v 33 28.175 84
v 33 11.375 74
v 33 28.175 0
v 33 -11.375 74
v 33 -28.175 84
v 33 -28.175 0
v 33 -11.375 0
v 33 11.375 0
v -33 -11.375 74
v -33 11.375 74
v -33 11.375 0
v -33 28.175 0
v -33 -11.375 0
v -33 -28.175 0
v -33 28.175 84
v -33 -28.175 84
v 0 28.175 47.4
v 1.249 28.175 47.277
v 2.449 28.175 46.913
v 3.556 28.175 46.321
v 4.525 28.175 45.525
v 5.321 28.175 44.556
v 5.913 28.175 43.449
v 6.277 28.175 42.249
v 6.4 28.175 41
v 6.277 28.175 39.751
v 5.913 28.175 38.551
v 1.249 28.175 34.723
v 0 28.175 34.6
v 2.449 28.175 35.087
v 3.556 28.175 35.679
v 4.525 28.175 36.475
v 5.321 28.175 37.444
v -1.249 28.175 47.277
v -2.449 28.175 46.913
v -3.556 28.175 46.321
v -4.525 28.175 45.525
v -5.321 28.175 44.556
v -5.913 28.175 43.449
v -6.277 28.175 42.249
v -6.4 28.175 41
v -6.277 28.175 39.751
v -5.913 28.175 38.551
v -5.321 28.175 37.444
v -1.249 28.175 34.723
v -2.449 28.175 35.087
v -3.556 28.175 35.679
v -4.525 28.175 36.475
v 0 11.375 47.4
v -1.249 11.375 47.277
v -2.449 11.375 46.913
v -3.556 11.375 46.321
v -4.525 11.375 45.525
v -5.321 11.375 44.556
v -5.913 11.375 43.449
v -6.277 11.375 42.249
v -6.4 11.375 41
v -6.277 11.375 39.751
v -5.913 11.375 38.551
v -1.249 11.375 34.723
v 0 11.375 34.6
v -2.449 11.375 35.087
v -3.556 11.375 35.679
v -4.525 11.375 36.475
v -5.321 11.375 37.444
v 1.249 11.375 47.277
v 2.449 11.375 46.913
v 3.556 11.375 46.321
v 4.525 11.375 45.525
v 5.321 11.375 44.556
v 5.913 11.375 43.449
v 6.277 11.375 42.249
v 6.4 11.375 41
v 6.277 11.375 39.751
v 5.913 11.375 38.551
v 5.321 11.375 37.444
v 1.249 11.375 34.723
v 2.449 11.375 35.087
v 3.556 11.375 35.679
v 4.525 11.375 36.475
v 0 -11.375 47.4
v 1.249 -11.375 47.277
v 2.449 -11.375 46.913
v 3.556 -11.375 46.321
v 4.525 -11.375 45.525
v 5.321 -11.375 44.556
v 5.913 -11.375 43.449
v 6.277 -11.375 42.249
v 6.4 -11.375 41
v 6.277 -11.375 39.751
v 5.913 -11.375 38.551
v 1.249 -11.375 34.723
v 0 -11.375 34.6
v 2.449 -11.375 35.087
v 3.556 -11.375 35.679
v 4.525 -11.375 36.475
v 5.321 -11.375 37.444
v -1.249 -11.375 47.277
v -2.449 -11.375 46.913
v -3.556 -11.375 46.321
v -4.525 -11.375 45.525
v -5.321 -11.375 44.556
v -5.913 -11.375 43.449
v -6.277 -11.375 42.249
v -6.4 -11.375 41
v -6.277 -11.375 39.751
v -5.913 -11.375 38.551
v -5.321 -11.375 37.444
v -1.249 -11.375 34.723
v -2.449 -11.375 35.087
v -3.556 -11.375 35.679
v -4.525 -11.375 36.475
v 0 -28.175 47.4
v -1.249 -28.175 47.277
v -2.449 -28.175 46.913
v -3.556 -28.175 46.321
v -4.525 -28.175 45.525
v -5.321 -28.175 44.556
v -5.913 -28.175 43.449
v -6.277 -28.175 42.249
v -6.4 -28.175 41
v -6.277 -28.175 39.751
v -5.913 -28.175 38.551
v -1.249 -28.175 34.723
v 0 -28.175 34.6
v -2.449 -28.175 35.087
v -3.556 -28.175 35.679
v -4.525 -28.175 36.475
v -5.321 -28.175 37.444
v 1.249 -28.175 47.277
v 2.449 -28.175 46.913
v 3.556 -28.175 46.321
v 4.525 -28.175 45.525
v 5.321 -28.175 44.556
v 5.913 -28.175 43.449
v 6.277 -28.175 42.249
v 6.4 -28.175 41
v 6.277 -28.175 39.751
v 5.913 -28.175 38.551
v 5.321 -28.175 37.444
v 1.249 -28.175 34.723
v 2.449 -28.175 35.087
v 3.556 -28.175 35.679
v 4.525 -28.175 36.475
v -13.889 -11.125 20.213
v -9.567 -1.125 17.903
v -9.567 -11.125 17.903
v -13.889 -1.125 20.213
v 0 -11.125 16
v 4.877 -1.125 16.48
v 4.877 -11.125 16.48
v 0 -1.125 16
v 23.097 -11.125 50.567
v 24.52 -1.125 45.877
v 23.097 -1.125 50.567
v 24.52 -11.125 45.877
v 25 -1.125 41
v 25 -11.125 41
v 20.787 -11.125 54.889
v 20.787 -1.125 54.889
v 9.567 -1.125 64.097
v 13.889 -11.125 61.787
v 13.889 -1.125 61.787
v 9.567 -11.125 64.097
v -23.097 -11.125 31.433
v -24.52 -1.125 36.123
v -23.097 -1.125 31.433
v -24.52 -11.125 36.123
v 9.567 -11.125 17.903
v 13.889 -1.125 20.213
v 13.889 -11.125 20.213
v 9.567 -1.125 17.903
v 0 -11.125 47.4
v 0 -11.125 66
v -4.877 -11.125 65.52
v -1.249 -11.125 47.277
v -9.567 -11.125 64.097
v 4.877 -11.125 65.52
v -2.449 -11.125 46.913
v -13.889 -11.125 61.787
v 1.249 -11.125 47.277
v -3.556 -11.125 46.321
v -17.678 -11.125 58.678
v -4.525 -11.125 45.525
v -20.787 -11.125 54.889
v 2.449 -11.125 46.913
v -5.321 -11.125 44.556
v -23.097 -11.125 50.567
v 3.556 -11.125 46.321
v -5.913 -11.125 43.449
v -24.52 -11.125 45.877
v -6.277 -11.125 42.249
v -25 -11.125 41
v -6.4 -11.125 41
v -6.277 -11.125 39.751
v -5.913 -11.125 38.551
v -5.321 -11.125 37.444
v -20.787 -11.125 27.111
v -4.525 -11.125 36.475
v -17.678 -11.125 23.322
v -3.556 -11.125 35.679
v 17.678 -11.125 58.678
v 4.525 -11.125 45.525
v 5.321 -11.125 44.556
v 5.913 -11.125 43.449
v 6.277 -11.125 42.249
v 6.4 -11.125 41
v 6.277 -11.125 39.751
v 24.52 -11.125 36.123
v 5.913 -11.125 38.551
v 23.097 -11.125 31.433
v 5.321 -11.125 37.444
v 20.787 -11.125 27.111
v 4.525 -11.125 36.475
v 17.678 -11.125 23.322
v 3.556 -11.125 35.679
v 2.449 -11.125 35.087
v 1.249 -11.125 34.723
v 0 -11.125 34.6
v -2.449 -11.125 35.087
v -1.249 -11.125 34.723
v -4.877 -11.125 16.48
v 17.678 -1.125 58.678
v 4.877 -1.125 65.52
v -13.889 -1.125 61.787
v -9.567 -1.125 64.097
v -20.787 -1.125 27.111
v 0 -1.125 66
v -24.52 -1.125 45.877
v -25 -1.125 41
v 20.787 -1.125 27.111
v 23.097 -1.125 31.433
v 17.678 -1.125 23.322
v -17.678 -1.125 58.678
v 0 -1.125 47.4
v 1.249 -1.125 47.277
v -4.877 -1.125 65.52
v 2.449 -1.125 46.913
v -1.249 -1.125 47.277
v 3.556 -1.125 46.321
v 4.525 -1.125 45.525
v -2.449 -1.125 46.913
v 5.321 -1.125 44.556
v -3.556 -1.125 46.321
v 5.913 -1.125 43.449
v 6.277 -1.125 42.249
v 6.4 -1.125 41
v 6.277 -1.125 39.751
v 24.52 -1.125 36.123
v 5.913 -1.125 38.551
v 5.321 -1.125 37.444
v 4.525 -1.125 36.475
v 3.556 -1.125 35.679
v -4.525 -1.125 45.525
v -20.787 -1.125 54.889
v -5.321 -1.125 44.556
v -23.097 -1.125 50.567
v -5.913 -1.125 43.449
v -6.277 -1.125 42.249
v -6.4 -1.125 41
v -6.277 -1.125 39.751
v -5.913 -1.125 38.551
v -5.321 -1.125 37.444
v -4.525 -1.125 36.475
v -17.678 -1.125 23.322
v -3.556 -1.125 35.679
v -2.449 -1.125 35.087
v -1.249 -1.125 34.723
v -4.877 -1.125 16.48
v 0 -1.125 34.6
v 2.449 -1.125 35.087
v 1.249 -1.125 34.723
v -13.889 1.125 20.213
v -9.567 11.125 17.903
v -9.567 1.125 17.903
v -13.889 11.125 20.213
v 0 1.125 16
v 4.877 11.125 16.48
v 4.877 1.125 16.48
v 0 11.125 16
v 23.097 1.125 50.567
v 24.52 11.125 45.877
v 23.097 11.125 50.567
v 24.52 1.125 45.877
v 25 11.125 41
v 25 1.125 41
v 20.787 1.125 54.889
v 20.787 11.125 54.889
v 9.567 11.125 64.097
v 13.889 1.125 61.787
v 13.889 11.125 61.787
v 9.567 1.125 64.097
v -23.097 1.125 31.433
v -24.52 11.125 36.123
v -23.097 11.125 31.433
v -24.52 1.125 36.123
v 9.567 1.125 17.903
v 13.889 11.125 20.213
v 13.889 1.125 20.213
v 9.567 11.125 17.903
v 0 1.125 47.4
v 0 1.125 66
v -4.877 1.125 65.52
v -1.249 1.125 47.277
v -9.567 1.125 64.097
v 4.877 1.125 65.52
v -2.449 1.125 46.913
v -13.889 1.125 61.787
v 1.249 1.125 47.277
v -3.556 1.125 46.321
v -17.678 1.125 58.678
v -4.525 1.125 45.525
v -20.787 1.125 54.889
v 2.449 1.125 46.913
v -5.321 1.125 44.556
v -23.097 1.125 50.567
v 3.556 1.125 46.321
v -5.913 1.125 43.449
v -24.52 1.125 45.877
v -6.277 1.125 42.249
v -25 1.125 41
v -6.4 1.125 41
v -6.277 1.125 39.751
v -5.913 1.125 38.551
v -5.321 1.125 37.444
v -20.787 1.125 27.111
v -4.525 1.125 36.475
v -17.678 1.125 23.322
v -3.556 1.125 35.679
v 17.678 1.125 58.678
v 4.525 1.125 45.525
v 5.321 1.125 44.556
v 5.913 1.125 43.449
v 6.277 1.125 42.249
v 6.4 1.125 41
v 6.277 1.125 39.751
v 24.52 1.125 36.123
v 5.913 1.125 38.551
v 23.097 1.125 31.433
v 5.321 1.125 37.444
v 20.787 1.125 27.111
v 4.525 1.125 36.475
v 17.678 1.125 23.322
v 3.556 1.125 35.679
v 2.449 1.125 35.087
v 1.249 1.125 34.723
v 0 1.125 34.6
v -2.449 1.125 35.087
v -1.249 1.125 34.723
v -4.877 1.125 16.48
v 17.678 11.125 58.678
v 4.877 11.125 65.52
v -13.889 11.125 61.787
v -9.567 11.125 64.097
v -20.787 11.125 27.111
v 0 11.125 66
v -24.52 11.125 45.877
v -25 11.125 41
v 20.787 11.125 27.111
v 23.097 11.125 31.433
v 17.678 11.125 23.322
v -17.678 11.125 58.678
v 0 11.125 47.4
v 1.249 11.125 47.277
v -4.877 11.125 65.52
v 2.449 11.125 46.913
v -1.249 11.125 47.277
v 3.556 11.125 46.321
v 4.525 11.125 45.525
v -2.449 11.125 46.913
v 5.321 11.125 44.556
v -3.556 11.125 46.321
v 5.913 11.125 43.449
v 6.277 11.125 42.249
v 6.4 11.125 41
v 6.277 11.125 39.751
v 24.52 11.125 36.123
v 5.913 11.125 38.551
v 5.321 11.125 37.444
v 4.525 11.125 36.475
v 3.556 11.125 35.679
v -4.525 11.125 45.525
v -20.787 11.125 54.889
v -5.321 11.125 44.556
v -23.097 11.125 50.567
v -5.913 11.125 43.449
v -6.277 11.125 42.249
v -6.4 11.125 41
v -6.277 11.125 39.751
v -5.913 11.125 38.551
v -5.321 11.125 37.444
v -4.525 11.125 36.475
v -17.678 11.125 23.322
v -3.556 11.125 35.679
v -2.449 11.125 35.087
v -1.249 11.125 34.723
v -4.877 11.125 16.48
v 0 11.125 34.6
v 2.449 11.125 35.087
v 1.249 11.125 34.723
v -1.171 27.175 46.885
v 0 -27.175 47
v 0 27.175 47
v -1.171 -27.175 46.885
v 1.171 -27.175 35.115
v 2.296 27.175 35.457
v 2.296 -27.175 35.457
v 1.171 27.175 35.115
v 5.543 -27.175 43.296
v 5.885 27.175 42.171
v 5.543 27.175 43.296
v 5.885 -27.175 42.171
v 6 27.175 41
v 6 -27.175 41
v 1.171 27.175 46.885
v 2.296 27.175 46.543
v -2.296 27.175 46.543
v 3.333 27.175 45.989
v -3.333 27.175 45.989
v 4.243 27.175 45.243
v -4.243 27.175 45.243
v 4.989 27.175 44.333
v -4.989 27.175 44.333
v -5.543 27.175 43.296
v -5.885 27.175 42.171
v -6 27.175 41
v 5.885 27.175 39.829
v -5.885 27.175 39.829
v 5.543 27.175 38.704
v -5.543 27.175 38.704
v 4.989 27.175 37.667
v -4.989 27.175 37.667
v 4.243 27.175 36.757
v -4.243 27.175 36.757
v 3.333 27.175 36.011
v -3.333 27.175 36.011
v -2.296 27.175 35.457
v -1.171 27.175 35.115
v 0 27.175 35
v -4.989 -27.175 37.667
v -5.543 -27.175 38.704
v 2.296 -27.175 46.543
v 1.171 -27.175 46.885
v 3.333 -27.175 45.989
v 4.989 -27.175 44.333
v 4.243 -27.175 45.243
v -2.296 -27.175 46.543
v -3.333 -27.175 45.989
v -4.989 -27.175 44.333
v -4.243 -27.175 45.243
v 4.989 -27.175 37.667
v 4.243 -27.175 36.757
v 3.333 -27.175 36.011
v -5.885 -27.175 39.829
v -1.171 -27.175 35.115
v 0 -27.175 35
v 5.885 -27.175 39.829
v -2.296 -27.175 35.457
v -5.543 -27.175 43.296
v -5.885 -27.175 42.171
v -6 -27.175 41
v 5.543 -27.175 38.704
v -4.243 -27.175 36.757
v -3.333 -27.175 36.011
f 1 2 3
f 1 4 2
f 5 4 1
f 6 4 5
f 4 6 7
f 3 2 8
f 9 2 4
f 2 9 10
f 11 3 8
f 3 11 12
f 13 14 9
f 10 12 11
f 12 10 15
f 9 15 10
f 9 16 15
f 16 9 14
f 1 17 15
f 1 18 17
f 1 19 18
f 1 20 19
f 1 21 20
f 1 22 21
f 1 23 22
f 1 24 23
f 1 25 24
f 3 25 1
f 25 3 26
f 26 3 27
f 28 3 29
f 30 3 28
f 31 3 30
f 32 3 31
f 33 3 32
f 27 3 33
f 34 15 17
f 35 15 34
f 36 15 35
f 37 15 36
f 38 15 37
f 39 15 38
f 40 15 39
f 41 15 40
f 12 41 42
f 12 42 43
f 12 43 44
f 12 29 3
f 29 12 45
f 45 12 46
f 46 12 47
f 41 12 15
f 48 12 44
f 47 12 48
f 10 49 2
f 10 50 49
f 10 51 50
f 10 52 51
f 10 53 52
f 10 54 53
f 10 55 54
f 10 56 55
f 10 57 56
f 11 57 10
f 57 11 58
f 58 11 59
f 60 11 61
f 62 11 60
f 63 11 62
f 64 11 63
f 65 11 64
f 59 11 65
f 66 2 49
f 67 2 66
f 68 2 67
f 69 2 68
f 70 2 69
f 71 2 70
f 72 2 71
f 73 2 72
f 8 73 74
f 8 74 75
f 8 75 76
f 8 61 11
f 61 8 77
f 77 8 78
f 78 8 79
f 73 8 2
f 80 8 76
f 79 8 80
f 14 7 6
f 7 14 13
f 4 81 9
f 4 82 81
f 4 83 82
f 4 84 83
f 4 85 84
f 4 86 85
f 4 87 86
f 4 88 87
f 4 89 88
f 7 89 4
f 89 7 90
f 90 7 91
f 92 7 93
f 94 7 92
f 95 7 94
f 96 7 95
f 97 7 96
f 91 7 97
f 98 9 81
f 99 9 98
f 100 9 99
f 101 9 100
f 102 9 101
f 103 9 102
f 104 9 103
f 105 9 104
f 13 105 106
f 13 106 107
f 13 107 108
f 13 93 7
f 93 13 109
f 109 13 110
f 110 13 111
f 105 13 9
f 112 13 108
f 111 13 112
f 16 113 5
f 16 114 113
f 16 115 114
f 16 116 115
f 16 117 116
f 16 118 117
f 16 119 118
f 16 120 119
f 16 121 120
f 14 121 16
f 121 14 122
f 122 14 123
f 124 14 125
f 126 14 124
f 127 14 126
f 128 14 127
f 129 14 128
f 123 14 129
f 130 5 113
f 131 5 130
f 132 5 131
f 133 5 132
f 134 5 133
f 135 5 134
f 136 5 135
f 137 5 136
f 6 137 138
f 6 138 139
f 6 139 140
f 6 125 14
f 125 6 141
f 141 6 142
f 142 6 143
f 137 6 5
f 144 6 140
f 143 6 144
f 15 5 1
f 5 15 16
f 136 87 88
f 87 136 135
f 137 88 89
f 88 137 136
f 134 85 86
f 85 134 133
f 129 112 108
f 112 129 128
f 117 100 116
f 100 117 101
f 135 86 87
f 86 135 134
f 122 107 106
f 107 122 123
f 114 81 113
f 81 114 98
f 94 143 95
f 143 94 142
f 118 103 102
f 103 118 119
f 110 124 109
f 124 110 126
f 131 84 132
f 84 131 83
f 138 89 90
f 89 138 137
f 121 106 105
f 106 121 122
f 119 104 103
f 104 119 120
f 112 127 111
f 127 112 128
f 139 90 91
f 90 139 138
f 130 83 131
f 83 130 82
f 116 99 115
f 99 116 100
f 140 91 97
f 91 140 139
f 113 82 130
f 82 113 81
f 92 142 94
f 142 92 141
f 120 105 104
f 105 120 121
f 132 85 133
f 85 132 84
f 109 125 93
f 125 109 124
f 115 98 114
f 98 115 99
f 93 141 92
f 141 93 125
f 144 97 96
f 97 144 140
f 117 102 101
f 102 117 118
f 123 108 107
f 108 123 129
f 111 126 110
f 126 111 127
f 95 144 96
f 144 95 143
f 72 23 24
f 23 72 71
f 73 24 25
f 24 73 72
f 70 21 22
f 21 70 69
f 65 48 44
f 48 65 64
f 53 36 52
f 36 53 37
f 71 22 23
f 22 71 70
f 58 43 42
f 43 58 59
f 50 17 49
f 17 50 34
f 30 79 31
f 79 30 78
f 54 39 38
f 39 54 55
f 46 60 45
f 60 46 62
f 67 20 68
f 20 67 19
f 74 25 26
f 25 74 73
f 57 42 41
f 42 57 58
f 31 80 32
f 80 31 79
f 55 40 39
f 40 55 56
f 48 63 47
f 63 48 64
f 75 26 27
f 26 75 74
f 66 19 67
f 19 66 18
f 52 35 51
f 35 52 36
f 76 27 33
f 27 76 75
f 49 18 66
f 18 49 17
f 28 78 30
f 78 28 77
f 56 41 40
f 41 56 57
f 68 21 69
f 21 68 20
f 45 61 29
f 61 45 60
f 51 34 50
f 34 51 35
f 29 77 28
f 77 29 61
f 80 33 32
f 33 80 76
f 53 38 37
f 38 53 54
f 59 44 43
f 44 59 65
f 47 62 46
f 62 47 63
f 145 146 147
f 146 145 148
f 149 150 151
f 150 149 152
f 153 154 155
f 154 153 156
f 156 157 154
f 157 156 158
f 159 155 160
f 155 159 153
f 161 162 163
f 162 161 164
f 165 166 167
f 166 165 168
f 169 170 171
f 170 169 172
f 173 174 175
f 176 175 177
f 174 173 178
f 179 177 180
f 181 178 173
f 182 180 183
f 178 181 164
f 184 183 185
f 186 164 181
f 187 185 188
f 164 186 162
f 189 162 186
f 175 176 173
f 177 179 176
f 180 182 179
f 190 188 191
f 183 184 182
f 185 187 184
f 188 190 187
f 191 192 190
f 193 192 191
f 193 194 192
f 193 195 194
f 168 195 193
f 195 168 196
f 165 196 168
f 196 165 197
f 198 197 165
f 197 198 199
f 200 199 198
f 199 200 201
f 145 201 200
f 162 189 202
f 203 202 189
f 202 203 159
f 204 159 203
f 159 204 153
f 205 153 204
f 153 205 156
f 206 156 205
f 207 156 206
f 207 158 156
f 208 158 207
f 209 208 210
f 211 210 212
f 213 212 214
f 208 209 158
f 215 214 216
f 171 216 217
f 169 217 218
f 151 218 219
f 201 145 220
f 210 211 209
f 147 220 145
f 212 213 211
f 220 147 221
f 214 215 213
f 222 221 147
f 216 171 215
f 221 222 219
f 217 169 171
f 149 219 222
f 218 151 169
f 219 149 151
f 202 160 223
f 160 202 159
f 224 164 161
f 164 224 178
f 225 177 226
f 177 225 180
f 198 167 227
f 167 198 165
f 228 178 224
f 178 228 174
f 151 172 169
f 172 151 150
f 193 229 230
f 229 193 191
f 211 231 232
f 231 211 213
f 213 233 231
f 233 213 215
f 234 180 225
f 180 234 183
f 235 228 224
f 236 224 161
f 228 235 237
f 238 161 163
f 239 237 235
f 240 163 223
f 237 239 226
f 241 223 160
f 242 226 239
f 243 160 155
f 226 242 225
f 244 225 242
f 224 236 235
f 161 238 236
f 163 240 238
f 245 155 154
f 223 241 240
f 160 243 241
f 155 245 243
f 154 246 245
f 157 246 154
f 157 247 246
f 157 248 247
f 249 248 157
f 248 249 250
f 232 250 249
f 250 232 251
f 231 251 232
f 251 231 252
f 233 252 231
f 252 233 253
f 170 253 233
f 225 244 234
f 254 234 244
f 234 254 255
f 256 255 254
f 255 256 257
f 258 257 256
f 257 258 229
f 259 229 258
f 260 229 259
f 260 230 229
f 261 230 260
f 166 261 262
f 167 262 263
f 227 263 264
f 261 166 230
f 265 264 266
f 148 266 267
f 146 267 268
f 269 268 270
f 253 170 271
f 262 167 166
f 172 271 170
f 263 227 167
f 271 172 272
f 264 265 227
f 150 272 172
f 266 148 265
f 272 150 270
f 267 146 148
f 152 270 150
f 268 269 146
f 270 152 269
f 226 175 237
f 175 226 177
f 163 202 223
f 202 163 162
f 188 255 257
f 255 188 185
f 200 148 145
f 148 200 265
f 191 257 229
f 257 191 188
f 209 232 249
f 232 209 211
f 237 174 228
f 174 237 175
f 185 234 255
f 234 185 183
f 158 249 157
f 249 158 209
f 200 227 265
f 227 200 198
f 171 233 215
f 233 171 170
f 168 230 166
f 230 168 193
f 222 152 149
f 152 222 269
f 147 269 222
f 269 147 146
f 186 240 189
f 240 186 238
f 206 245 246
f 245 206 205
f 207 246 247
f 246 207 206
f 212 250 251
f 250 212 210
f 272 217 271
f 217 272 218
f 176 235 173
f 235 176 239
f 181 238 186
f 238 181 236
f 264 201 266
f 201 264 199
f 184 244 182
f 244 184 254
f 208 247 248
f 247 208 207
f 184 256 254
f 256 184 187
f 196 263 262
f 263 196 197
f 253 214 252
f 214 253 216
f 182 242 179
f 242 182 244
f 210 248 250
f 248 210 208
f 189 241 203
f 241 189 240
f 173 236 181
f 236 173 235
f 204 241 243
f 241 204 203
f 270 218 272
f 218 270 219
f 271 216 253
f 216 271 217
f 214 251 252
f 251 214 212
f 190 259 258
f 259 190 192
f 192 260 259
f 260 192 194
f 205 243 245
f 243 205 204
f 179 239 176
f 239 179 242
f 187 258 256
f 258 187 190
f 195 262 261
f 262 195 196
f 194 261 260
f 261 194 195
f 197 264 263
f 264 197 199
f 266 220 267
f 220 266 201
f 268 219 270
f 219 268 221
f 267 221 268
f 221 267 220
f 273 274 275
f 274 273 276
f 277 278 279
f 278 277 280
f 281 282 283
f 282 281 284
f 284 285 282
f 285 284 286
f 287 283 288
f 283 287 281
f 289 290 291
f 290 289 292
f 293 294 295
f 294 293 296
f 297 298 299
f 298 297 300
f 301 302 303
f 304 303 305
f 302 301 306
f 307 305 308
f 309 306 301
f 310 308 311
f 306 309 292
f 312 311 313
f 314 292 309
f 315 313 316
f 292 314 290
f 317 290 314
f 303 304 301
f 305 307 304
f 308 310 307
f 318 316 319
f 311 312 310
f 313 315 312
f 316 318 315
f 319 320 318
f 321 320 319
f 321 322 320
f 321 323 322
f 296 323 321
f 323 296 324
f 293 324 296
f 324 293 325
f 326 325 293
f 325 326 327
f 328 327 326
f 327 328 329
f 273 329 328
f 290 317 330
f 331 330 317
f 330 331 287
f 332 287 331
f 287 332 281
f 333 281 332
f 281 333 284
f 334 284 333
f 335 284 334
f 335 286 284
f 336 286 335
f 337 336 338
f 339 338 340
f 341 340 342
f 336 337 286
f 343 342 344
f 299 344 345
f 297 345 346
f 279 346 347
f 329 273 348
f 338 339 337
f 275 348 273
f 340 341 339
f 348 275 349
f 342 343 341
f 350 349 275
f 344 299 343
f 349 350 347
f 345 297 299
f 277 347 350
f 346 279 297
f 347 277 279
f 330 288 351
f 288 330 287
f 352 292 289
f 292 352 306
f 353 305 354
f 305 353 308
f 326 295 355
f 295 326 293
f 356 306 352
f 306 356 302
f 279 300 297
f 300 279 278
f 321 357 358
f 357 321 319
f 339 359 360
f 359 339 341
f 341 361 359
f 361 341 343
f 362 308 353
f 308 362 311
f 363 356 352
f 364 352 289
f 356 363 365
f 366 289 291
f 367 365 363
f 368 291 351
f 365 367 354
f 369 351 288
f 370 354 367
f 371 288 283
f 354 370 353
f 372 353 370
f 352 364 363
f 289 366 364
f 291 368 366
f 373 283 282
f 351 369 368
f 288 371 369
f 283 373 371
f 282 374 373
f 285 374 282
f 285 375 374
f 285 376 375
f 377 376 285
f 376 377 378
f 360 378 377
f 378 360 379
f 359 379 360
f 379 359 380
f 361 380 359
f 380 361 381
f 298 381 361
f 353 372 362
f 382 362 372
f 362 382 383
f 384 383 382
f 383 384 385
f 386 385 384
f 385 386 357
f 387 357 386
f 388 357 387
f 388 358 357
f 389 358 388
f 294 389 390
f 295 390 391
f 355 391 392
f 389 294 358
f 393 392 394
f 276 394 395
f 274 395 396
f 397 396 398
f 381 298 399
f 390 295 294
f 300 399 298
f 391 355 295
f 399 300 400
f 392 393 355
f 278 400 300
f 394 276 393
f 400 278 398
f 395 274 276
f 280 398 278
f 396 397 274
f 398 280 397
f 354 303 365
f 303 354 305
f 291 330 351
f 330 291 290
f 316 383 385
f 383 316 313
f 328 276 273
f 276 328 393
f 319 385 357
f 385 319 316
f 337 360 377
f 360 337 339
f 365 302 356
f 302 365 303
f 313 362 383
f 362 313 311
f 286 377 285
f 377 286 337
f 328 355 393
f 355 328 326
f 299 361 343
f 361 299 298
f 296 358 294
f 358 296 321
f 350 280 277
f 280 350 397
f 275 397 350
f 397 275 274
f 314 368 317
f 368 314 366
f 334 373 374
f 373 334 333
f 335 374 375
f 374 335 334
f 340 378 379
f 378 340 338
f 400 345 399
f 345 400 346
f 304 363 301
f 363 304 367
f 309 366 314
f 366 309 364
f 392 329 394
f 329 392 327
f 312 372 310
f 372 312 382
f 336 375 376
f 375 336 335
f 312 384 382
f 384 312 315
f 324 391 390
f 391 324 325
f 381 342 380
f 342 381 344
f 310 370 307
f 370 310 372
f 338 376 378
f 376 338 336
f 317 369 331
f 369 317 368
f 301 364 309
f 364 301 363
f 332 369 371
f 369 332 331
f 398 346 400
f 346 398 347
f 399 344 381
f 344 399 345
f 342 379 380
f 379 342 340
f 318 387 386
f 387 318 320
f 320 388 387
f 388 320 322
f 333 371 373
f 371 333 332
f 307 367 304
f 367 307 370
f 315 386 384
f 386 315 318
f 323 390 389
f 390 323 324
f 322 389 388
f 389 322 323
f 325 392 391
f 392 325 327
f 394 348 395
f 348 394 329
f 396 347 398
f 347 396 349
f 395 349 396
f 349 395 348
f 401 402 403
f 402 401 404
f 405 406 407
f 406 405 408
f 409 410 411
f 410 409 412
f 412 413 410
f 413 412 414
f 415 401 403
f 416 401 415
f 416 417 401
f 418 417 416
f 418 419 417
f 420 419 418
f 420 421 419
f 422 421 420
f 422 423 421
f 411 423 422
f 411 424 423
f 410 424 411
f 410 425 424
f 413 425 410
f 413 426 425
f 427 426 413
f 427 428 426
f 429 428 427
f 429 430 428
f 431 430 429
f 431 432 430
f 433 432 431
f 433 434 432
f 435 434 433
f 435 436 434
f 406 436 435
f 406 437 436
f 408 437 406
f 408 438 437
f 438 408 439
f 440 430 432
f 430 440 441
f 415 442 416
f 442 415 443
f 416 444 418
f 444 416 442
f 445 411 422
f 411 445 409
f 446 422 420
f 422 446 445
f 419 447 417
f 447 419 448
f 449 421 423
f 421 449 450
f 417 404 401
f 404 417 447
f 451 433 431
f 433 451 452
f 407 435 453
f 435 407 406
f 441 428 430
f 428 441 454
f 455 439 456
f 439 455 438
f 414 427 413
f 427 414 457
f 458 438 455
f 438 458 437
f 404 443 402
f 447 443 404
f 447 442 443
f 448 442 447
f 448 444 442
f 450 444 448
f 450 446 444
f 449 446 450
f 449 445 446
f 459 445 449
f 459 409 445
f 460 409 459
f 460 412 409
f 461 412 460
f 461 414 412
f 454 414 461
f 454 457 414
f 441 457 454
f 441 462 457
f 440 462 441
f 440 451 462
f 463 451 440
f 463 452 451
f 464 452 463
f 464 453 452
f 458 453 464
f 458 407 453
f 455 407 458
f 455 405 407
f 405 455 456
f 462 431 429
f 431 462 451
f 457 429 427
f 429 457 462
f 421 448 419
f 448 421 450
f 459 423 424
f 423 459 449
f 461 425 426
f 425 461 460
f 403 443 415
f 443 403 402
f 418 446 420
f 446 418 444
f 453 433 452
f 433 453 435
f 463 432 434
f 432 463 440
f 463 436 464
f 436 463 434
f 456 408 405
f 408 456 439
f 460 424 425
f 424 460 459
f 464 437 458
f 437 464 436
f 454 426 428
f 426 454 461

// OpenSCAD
$fn = 32;

// ------------------------------------------------------------------------
// Trolley wheel set: wheels d50, fork 74 mm tall
// Every part is its own module, assembly() places every instance.
// ------------------------------------------------------------------------

// --- part 1 ---
module trolley_fork() {
  difference() {
    union() {
      translate([-33, 11.375, 0]) cube([66, 16.8, 74]);
      translate([-33, -28.175, 0]) cube([66, 16.8, 74]);
      translate([-33, -28.175, 74]) cube([66, 56.35, 10]);
    }
    translate([0, -19.775, 41]) rotate([90, 0, 0]) cylinder(h = 18.8, d = 12.8, center = true);
    translate([0, 19.775, 41]) rotate([90, 0, 0]) cylinder(h = 18.8, d = 12.8, center = true);
  }
}

// --- part 2 ---
module trolley_wheel() {
  difference() {
      translate([0, 0, 0]) cylinder(h = 10, d = 50);
      translate([0, 0, -1]) cylinder(h = 12, d = 12.8);
    }
}

// --- part 3 ---
module trolley_axle() {
  translate([0, 0, -27.175]) cylinder(h = 54.35, d = 12);
}

// --- assembly ---
module assembly() {
  color([0.80, 0.24, 0.20]) translate([0, 0, 0]) rotate([0, 0, 0]) trolley_fork();
  color([0.20, 0.45, 0.75]) translate([0, -1.125, 41]) rotate([90, 0, 0]) trolley_wheel();
  color([0.25, 0.62, 0.32]) translate([0, 11.125, 41]) rotate([90, 0, 0]) trolley_wheel();
  color([0.92, 0.70, 0.18]) translate([0, 0, 41]) rotate([90, 0, 0]) trolley_axle();
}

assembly();
